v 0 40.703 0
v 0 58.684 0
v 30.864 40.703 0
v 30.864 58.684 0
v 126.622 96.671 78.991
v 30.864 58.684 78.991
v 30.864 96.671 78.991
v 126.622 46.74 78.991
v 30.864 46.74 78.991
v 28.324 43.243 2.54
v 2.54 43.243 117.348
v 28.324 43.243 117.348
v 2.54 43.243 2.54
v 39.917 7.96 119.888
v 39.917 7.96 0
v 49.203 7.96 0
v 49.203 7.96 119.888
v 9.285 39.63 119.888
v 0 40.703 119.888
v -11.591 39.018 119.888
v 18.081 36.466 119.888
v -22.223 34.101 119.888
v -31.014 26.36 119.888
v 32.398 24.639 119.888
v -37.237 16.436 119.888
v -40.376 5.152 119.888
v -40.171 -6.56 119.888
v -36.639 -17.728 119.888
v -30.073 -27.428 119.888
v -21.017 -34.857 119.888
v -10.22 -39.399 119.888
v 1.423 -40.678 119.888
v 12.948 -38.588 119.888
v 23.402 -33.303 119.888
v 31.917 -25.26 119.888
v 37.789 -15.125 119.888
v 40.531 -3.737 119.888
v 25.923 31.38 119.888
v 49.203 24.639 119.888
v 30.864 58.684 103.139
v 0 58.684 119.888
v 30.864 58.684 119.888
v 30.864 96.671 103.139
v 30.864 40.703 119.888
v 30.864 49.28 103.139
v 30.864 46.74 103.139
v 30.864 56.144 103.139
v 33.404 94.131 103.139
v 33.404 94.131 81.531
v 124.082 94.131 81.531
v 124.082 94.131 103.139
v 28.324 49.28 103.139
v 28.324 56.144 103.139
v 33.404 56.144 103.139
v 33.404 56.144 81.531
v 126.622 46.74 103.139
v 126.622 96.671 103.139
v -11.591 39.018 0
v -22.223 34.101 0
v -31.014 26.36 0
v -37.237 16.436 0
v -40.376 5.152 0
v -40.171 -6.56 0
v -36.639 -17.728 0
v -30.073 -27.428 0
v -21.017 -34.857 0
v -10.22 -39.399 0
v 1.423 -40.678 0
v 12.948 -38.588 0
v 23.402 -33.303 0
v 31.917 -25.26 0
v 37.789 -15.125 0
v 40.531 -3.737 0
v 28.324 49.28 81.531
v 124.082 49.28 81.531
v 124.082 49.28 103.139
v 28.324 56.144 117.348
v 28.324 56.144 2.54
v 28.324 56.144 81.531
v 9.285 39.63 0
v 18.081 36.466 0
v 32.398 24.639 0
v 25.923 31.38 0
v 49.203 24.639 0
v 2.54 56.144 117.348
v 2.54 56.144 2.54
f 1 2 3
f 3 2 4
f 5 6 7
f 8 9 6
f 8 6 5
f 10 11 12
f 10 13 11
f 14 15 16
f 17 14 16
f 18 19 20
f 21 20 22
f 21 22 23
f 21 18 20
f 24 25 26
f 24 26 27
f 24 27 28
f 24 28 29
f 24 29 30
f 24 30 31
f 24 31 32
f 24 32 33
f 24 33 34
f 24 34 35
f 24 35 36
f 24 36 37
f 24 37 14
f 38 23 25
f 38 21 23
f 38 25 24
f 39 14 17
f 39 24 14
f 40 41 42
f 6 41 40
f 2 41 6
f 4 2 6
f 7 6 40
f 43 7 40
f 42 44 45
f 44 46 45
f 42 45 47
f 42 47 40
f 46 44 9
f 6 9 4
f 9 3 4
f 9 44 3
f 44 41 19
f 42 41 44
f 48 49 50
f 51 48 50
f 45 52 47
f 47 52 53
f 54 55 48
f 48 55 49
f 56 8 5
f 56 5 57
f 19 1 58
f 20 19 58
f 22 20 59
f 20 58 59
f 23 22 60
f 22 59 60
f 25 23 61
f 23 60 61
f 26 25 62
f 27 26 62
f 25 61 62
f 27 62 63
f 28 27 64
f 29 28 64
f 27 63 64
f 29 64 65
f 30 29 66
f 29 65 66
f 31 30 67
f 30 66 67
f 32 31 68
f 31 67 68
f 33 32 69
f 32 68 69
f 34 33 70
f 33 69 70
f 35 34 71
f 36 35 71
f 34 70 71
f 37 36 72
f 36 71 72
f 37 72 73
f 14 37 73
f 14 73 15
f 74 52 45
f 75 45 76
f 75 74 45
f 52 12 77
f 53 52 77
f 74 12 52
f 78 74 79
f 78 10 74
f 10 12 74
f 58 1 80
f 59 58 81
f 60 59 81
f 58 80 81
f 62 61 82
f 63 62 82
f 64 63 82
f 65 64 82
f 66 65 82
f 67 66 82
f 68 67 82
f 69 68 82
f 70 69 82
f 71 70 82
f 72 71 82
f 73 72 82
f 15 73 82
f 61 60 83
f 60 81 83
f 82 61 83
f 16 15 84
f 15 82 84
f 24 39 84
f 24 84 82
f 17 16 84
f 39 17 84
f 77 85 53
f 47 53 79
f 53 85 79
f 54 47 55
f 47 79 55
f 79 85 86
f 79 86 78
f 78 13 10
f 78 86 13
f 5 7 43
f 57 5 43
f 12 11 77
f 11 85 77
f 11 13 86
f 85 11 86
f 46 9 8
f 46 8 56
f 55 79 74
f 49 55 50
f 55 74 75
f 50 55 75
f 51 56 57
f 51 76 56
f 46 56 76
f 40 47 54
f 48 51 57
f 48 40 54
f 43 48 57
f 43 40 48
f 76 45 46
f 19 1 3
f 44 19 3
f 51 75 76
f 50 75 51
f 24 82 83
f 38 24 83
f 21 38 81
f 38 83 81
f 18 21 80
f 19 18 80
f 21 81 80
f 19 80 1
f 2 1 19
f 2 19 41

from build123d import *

# Parameters (mm, degrees)
F1_DEPTH = 119.888
F0_W     = 30.8635719121
F0_H     = 17.9806766311
F2_W     = 6.2429867685
F2_H     = 24.1485238075
F3_DEPTH = 95.758
F4_DEPTH = 43.688
F5_T     = -2.54


# Not quite as in the source:
# - a shell that OpenCascade refuses in one call is made with other operations: the cavity is built on its own and cut out


with BuildPart() as f1:
    # F0 (on Top) → F1 (new body)
    with BuildSketch(Plane.XY):
        with BuildLine():
            Line((49.202632159, 24.6388483793), (32.3984145703, 24.6388483793))
            ThreePointArc((32.3984145703, 24.6388483793), (18.0811546827, 36.4664498062), (0, 40.7029497227))
            ThreePointArc((0, 40.7029497227), (-25.8139115454, -31.4701777378), (39.9169293616, 7.9604564235))
            Line((39.9169293616, 7.9604564235), (49.202632159, 7.9604564235))
            Line((49.202632159, 7.9604564235), (49.202632159, 24.6388483793))
        make_face()
    extrude(amount=F1_DEPTH)


with BuildPart() as f1b:
    # F0 (on Top) → F1, piece 2 (new body)
    with BuildSketch(Plane.XY):
        with Locations((15.431785956, 49.6932880382)):
            Rectangle(F0_W, F0_H)
    extrude(amount=F1_DEPTH)

    # F2 (on face) → F3 (join)
    with BuildSketch(Plane.YZ.offset(30.8635719121)):
        with Locations((49.86118339, 91.0649970174)):
            Rectangle(F2_W, F2_H)
    extrude(amount=F3_DEPTH)

    # F4 (add): a face of the model
    f4_faces = [f1b.faces().sort_by_distance(p)[0] for p in [
        (78.7425719121, 52.9826767743, 91.0649970174),
    ]]
    extrude(f4_faces, amount=F4_DEPTH)

    # F5: a shell. OpenCascade refuses it in one call, so the cavity is built on its own and cut out:
    # the body offset inwards by the wall thickness, plus a prism from it out through each open face.
    f5_core = offset(f1b.part, amount=F5_T, kind=Kind.INTERSECTION, mode=Mode.PRIVATE)
    f5_exits = [f5_core.faces().sort_by_distance(p)[0] for p in [
        (78.335566, 71.543725, 100.599259),
    ]]
    add(f5_core, mode=Mode.SUBTRACT)
    extrude(f5_exits, amount=-F5_T, mode=Mode.SUBTRACT)


solid = Compound([f1.part, f1b.part])
